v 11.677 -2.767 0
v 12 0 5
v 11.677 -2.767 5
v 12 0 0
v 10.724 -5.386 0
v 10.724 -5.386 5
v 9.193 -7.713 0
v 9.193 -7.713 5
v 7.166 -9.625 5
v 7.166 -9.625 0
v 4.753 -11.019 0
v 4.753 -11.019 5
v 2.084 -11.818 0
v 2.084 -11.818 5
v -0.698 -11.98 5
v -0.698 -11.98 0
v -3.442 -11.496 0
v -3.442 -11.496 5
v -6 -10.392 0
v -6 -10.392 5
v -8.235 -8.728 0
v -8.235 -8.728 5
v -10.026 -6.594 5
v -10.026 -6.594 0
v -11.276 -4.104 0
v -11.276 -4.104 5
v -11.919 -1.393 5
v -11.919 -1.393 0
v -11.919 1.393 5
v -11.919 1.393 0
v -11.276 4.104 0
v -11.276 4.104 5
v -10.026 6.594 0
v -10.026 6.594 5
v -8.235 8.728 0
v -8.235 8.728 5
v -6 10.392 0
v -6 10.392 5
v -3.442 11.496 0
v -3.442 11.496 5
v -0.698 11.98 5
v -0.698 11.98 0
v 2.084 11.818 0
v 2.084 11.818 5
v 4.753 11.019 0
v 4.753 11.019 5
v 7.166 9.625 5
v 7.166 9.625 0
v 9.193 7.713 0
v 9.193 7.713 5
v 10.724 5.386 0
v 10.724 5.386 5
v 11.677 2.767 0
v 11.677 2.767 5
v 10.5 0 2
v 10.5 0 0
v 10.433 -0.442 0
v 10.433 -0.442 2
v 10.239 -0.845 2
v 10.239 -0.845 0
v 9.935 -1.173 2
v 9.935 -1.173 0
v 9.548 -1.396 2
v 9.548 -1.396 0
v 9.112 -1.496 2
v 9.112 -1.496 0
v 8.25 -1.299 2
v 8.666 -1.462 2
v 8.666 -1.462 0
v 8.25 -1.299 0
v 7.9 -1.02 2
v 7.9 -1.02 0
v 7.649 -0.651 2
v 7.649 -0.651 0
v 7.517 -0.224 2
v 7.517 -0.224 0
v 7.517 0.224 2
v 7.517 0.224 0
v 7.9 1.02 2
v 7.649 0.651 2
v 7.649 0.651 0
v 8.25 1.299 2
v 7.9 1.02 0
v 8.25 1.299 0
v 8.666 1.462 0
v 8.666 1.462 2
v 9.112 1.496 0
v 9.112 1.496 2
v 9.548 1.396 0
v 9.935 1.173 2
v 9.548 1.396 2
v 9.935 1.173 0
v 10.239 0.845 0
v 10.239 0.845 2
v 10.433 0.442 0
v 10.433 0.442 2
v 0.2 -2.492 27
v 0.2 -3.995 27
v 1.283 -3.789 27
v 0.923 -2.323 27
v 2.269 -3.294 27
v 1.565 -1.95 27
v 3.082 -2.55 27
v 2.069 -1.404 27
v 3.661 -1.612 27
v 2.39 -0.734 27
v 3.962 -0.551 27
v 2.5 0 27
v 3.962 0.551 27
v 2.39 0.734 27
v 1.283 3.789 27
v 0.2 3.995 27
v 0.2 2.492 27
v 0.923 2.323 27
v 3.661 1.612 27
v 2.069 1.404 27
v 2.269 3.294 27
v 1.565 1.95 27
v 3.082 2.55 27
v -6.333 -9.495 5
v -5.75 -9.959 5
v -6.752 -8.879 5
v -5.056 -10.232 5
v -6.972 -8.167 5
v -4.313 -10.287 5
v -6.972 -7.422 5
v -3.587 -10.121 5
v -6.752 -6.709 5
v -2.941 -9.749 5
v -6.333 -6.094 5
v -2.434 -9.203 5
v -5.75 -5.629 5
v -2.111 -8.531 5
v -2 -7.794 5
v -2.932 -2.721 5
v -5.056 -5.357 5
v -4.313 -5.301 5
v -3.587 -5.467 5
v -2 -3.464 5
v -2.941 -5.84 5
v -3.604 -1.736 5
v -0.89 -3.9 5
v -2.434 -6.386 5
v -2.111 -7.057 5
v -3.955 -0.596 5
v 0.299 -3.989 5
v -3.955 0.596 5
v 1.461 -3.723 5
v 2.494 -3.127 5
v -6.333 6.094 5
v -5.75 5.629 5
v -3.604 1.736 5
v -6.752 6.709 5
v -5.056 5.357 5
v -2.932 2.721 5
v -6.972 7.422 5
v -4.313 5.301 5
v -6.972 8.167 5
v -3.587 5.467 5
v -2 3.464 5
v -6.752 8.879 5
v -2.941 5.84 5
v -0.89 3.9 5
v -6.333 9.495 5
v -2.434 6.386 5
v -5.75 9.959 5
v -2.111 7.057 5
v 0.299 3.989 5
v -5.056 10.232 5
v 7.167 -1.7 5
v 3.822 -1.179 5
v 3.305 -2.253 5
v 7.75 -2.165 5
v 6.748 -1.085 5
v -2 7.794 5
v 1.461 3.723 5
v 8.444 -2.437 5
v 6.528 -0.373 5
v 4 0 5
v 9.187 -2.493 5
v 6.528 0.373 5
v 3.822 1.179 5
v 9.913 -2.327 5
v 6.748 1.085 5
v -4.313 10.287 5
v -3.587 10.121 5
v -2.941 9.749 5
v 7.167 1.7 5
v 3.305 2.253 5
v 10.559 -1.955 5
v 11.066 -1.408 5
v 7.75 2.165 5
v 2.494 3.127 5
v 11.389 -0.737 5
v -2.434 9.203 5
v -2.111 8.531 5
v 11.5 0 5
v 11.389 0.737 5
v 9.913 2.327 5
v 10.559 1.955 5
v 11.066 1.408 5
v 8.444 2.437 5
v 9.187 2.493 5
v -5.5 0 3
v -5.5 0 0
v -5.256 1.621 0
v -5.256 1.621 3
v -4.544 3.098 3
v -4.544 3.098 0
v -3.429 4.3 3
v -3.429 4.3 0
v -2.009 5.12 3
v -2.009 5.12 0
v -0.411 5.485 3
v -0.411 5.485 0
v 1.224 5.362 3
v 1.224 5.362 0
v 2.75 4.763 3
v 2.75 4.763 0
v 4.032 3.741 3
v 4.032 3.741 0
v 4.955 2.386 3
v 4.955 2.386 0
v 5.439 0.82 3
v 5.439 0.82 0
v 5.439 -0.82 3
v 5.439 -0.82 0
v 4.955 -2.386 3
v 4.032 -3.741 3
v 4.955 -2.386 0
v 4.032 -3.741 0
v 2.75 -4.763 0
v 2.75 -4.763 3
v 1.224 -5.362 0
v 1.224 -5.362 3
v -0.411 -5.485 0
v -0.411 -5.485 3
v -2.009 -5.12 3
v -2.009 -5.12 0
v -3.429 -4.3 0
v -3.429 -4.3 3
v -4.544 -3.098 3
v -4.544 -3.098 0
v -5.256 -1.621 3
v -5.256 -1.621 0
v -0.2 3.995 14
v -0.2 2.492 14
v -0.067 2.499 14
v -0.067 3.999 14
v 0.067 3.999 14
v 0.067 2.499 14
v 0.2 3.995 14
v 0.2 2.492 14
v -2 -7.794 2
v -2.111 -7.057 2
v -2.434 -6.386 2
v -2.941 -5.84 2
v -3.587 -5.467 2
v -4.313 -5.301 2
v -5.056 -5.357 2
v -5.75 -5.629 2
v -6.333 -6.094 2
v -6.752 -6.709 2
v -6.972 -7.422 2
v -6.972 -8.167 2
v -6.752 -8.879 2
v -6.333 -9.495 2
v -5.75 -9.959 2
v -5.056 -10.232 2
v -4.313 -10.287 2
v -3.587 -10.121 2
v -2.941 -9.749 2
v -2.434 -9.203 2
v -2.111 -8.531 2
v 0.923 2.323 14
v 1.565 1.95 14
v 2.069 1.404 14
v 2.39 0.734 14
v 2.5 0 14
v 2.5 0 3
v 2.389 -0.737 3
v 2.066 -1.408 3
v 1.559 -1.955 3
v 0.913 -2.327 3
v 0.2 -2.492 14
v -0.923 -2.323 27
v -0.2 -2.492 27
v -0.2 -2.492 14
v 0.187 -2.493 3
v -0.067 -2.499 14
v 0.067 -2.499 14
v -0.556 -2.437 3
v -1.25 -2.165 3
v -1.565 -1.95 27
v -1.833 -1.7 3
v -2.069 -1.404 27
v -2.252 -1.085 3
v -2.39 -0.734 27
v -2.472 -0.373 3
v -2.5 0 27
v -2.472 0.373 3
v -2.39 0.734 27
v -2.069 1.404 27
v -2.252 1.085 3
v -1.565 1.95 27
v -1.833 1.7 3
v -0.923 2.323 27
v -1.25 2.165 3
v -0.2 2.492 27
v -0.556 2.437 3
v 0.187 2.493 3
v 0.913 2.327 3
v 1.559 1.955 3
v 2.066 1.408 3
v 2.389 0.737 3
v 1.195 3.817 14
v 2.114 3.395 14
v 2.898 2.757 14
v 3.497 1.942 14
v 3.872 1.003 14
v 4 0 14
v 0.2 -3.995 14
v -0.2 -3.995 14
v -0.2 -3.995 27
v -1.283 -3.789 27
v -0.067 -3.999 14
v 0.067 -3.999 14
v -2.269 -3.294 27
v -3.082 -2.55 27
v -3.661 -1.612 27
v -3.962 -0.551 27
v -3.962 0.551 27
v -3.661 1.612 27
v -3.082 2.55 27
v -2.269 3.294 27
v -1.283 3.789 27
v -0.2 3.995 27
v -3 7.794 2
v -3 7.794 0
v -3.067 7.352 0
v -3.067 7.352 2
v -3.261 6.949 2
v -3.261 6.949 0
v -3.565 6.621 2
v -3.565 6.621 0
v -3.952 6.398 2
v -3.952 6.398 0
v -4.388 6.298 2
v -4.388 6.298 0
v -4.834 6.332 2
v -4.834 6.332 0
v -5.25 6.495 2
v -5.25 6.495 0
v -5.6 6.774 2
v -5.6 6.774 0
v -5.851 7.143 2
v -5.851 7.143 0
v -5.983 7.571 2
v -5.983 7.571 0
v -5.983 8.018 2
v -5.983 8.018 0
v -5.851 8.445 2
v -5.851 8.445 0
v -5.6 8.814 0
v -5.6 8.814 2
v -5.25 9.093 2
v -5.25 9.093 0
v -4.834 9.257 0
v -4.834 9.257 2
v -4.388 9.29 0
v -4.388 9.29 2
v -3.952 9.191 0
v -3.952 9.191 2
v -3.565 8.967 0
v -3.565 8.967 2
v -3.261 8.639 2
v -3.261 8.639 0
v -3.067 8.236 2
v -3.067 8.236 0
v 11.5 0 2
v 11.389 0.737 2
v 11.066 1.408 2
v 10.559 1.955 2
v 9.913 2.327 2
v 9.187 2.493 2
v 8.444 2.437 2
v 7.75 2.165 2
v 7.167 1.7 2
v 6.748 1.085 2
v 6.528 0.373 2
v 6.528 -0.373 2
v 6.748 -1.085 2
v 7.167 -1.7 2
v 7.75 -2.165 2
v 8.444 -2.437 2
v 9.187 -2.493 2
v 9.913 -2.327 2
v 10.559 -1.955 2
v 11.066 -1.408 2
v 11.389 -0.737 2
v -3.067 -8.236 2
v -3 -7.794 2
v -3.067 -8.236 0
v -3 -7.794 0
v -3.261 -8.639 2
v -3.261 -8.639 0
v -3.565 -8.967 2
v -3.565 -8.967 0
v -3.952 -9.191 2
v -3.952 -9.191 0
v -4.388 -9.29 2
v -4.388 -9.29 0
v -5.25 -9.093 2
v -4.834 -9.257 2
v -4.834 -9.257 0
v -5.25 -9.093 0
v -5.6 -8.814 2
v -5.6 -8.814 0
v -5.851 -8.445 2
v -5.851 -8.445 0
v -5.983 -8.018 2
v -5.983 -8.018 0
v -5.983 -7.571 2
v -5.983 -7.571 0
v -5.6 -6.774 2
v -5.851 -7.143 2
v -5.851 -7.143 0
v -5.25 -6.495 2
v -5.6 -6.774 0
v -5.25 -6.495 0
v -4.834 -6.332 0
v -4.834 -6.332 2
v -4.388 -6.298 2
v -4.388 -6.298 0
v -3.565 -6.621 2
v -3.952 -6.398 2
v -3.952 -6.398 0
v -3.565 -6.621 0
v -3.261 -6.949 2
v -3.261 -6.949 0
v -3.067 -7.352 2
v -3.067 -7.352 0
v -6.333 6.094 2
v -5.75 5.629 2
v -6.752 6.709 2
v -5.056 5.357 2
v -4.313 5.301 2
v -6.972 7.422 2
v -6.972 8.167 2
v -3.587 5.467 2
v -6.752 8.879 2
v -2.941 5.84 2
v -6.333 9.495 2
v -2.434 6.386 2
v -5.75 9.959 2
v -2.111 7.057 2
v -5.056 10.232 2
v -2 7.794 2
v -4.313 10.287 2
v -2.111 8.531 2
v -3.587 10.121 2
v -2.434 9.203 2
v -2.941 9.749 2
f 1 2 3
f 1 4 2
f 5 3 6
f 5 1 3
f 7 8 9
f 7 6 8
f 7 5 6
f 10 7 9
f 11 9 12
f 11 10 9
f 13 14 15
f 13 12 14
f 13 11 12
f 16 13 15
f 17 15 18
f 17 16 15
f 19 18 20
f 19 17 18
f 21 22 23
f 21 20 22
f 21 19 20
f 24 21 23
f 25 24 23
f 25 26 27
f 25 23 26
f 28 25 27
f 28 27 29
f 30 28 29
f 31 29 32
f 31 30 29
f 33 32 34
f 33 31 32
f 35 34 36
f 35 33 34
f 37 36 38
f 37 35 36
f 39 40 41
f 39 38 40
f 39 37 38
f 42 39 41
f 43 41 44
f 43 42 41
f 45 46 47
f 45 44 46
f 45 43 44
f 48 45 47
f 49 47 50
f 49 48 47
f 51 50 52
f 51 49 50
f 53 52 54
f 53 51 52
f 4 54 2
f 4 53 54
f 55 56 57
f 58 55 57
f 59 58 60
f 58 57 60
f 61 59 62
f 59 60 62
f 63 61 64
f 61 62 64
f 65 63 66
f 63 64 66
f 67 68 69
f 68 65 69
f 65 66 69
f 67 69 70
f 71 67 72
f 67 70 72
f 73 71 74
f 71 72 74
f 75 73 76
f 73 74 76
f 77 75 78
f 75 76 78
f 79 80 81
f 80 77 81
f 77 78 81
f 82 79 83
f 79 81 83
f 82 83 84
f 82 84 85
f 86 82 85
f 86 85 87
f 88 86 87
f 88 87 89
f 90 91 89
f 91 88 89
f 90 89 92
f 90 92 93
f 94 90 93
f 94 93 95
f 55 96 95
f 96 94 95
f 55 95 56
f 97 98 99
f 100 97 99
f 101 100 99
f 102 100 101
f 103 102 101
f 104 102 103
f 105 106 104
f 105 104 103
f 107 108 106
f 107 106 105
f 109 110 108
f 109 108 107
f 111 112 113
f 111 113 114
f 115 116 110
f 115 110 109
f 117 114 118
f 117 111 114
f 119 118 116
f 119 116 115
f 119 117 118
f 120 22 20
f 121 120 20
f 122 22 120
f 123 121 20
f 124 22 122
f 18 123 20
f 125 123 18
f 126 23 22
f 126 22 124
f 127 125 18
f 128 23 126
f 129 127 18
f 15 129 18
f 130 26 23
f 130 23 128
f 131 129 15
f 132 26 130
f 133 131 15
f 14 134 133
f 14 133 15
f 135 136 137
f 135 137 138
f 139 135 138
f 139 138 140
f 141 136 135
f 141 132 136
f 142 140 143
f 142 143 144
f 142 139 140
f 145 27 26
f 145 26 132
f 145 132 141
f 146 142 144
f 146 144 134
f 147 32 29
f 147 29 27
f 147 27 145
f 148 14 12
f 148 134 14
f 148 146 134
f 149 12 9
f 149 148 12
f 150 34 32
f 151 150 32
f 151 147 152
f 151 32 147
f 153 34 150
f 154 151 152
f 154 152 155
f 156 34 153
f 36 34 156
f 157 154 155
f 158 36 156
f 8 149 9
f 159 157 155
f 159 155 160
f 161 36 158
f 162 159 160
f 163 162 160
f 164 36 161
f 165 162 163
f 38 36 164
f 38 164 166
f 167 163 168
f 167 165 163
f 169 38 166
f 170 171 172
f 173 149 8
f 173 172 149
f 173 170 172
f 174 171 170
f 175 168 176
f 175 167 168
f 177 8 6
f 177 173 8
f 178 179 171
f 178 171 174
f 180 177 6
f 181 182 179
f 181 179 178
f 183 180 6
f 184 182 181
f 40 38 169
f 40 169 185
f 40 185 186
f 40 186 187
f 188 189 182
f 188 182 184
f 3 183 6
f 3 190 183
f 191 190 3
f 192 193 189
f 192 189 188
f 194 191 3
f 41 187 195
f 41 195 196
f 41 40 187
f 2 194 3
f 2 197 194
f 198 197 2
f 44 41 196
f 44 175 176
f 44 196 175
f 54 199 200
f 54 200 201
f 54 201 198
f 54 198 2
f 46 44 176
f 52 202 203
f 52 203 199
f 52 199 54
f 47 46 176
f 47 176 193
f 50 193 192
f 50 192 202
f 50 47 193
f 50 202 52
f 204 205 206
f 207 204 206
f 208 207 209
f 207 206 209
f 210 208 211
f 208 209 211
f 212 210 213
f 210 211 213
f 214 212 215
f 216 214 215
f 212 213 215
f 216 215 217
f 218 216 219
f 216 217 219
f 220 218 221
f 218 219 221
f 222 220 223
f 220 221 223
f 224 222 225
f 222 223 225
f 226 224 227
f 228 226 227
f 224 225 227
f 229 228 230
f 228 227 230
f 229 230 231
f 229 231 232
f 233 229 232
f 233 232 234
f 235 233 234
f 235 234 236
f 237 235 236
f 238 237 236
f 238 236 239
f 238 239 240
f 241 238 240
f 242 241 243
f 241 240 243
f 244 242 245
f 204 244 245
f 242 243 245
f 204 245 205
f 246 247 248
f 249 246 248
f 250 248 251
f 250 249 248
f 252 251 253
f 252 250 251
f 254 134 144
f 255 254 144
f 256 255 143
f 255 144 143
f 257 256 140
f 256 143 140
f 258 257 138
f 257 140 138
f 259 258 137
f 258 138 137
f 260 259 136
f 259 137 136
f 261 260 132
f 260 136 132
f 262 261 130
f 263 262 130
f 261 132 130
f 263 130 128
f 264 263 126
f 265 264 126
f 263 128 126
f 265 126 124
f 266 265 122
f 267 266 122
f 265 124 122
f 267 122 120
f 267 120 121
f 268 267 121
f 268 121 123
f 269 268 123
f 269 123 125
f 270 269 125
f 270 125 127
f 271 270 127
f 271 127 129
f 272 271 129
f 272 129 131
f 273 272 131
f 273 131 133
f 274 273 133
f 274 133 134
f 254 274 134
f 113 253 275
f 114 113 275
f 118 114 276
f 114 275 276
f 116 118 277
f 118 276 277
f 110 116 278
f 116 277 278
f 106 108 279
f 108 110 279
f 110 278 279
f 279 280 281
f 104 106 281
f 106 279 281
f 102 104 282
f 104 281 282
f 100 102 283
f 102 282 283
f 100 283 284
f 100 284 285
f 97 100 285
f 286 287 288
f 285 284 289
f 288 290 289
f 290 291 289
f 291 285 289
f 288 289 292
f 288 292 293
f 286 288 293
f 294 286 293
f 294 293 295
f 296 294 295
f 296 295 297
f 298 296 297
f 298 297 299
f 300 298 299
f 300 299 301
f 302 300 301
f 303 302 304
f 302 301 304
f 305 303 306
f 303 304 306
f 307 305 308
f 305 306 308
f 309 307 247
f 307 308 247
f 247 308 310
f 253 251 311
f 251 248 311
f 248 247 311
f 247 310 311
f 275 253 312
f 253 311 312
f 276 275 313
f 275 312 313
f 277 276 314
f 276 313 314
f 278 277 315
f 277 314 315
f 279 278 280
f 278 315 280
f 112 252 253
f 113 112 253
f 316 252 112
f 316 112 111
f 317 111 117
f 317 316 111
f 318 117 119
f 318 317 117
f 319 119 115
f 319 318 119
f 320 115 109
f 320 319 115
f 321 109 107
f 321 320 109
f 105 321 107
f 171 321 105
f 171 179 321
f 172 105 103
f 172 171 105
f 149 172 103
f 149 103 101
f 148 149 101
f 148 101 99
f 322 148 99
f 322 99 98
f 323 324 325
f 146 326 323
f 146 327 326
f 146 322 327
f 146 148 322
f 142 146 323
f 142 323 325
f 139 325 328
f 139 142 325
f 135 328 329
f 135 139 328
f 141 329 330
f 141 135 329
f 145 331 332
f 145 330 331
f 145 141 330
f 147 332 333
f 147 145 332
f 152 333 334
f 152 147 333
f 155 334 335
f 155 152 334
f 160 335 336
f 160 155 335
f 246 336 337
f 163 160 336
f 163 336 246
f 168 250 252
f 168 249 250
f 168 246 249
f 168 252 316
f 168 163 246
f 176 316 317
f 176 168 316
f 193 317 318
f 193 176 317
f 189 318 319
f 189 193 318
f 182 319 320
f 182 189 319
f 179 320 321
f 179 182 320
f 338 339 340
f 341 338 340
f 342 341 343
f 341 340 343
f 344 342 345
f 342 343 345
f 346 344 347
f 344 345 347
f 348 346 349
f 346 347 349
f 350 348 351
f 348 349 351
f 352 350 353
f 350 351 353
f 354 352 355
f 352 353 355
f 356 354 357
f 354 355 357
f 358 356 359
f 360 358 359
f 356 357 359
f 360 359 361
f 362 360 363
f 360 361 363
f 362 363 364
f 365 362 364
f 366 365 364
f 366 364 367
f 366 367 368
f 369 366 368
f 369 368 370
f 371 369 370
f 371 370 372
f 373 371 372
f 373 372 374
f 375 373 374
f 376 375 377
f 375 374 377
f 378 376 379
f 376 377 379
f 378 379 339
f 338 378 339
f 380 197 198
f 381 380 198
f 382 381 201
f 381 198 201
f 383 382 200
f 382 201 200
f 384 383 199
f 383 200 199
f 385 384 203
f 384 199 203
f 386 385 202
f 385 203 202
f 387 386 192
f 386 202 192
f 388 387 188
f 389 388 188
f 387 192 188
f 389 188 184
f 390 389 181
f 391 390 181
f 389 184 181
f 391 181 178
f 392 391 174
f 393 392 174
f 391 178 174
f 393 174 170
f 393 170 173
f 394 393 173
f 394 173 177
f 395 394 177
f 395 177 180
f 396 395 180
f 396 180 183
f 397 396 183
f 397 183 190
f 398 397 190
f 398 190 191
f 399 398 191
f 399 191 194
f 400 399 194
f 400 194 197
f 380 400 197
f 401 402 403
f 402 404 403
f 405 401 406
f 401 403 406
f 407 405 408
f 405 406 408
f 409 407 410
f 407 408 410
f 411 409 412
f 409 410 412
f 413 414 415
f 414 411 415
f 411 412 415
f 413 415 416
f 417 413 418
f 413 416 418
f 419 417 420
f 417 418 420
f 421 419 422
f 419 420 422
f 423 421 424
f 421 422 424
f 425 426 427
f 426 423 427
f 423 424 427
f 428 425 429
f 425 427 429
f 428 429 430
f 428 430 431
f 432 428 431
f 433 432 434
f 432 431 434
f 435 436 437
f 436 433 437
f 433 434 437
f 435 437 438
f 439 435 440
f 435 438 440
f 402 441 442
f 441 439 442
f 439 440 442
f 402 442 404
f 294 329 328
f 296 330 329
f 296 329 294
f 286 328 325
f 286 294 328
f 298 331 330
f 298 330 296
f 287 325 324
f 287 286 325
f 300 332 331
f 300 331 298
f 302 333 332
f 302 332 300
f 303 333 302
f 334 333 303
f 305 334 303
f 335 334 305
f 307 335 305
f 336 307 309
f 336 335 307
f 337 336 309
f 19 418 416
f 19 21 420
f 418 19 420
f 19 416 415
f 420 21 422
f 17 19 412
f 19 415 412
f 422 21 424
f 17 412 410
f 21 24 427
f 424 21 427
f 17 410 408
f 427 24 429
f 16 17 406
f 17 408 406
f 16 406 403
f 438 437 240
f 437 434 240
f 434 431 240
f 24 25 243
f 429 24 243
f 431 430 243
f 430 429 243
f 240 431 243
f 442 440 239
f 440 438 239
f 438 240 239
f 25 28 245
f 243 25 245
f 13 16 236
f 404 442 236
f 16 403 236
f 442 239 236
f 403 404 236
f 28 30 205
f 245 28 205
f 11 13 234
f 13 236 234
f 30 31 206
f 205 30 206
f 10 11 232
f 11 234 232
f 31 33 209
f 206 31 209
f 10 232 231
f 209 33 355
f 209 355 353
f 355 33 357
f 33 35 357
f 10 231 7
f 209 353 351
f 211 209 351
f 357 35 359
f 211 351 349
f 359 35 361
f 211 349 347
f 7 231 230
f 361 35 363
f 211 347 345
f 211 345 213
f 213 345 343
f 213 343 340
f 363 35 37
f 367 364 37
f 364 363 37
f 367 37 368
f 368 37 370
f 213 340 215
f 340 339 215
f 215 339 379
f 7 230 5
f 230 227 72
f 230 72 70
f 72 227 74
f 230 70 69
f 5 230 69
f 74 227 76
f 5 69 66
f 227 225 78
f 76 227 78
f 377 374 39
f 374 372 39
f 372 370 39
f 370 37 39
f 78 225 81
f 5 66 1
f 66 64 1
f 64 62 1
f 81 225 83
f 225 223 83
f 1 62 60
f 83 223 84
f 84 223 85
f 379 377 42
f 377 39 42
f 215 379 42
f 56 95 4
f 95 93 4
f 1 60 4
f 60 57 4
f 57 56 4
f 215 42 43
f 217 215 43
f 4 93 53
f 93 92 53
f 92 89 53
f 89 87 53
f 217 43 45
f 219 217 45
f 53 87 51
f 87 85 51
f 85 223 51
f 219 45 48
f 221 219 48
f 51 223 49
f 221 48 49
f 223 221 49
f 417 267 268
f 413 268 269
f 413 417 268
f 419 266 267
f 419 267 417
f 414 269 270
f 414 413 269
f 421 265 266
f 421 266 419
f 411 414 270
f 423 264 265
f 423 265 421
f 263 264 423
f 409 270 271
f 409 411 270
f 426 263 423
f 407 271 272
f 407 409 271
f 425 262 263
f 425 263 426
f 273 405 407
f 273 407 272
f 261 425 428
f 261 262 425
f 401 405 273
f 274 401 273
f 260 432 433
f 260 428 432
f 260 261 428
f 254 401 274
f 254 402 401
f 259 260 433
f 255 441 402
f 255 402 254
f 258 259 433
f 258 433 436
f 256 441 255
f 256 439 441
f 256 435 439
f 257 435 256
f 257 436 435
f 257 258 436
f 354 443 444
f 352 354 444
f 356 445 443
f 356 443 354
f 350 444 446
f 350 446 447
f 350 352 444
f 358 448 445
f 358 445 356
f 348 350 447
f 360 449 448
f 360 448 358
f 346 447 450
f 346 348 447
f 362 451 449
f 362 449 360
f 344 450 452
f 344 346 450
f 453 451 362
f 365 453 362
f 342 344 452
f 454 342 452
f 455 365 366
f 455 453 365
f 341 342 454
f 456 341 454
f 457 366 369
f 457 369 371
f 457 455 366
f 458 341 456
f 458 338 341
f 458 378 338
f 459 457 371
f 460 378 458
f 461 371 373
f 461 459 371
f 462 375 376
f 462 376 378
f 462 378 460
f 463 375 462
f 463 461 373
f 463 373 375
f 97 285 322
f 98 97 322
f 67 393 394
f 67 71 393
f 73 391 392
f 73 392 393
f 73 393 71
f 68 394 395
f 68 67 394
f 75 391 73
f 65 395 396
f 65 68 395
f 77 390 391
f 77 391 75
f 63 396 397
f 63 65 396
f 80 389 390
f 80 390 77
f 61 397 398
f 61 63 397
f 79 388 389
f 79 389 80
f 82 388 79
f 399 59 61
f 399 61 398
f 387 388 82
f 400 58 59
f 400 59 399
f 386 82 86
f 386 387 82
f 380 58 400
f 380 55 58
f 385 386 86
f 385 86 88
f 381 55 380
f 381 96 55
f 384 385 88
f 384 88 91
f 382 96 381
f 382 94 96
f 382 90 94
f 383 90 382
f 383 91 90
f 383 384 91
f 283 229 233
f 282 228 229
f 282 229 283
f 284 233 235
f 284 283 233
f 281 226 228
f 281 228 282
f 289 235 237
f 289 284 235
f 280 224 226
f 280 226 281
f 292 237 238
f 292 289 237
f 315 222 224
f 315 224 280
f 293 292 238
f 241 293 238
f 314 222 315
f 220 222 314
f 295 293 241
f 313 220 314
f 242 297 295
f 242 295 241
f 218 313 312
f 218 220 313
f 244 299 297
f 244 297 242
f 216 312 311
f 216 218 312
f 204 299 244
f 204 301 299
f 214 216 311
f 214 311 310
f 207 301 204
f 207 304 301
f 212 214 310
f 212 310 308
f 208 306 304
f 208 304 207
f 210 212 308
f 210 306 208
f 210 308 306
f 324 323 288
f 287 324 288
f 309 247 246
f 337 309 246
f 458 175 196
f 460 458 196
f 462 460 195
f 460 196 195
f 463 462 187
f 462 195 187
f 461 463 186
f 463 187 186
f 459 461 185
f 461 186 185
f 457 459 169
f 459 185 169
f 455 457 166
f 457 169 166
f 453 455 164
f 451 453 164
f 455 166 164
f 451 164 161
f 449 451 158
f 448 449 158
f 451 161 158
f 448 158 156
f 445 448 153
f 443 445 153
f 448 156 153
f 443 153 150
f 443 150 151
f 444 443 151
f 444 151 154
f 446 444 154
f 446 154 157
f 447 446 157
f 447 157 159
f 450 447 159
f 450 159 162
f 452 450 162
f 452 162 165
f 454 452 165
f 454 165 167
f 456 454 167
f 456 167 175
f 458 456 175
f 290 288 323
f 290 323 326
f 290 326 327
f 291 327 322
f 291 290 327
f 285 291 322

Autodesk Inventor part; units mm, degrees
ref_plane "YZ Plane" through (0, 0, 0) normal (1, 0, 0) x (0, 1, 0)
ref_plane "XZ Plane" through (0, 0, 0) normal (0, 1, 0) x (-1, 0, 0)
ref_plane "XY Plane" through (0, 0, 0) normal (0, 0, 1) x (1, 0, 0)
sketch "Sketch1" plane through (0, 0, 0) normal (0, 0, 1) x (1, 0, 0)
  circle A0 centre (0, 0) radius 12
  circle A1 centre (0, 0) radius 9 construction
  circle A2 centre (9, 0) radius 1.5
  circle A3 centre (-4.5, -7.7942) radius 1.5
  circle A4 centre (-4.5, 7.7942) radius 1.5
  line L0 (9, 0) -> (-4.5, -7.7942) construction
  line L1 (-4.5, 7.7942) -> (-4.5, -7.7942) construction
  line L2 (9, 0) -> (-4.5, 7.7942) construction
  circle A5 centre (0, 0) radius 2.5
  dimension "d0" = 24
  dimension "d1" = 18
  dimension "d2" = 3
  dimension "d3" = 5
extrude "Extrusion1" add sketch "Sketch1" along normal blind 5
sketch "Sketch2" plane through (0, 0, 5) normal (0, 0, 1) x (1, 0, 0)
  circle A0 centre (9, 0) radius 2.5
  circle A1 centre (-4.5, 7.7942) radius 2.5
  circle A2 centre (-4.5, -7.7942) radius 2.5
  circle A3 centre (9, 0) radius 1.5 projected
  circle A4 centre (-4.5, -7.7942) radius 1.5 projected
  circle A5 centre (-4.5, 7.7942) radius 1.5 projected
  circle A6 centre (0, 0) radius 4
  circle A7 centre (0, 0) radius 2.5 projected
  circle A8 centre (0, 0) radius 6.5
  dimension "d6" = 5
  dimension "d7" = 8
  dimension "d12" = 13
extrude "Extrusion2" cut sketch "Sketch2" against normal blind 3 contours A0 | A2 | A1 | A5
extrude "Extrusion3" add sketch "Sketch2" along normal blind 9 contours A6
sketch "Sketch3" plane through (0, 0, 0) normal (0, 0, -1) x (-1, 0, 0)
  circle A0 centre (0, 0) radius 12 projected
  circle A1 centre (0, 0) radius 5.5
  dimension "d13" = 11
extrude "Extrusion4" cut sketch "Sketch3" against normal blind 3 contours A1
sketch "Sketch4" plane through (0, 0, 14) normal (0, 0, 1) x (1, 0, 0)
  circle A0 centre (0, 0) radius 4 projected
  circle A1 centre (0, 0) radius 2.5 projected
  line L0 (-0.2, -4) -> (-0.2, 4)
  line L1 (-0.2, 4) -> (0.2, 4)
  line L2 (0.2, 4) -> (0.2, -4)
  line L3 (0.2, -4) -> (-0.2, -4)
  point P0 (0, -4)
  point P1 (0, 4)
  point P2 (0.2, -2.492)
  point P3 (0.2, -3.995)
  point P4 (0.2, 3.995)
  point P5 (0.2, 2.492)
  point P6 (-0.2, 2.492)
  point P7 (-0.2, 3.995)
  point P8 (-0.2, -3.995)
  point P9 (-0.2, -2.492)
  dimension "d16" = 0.4
extrude "Extrusion5" add sketch "Sketch4" along normal blind 13 contours A0 L2 A1 | L0 A1 A0
properties part number "Bearing_Mount"
